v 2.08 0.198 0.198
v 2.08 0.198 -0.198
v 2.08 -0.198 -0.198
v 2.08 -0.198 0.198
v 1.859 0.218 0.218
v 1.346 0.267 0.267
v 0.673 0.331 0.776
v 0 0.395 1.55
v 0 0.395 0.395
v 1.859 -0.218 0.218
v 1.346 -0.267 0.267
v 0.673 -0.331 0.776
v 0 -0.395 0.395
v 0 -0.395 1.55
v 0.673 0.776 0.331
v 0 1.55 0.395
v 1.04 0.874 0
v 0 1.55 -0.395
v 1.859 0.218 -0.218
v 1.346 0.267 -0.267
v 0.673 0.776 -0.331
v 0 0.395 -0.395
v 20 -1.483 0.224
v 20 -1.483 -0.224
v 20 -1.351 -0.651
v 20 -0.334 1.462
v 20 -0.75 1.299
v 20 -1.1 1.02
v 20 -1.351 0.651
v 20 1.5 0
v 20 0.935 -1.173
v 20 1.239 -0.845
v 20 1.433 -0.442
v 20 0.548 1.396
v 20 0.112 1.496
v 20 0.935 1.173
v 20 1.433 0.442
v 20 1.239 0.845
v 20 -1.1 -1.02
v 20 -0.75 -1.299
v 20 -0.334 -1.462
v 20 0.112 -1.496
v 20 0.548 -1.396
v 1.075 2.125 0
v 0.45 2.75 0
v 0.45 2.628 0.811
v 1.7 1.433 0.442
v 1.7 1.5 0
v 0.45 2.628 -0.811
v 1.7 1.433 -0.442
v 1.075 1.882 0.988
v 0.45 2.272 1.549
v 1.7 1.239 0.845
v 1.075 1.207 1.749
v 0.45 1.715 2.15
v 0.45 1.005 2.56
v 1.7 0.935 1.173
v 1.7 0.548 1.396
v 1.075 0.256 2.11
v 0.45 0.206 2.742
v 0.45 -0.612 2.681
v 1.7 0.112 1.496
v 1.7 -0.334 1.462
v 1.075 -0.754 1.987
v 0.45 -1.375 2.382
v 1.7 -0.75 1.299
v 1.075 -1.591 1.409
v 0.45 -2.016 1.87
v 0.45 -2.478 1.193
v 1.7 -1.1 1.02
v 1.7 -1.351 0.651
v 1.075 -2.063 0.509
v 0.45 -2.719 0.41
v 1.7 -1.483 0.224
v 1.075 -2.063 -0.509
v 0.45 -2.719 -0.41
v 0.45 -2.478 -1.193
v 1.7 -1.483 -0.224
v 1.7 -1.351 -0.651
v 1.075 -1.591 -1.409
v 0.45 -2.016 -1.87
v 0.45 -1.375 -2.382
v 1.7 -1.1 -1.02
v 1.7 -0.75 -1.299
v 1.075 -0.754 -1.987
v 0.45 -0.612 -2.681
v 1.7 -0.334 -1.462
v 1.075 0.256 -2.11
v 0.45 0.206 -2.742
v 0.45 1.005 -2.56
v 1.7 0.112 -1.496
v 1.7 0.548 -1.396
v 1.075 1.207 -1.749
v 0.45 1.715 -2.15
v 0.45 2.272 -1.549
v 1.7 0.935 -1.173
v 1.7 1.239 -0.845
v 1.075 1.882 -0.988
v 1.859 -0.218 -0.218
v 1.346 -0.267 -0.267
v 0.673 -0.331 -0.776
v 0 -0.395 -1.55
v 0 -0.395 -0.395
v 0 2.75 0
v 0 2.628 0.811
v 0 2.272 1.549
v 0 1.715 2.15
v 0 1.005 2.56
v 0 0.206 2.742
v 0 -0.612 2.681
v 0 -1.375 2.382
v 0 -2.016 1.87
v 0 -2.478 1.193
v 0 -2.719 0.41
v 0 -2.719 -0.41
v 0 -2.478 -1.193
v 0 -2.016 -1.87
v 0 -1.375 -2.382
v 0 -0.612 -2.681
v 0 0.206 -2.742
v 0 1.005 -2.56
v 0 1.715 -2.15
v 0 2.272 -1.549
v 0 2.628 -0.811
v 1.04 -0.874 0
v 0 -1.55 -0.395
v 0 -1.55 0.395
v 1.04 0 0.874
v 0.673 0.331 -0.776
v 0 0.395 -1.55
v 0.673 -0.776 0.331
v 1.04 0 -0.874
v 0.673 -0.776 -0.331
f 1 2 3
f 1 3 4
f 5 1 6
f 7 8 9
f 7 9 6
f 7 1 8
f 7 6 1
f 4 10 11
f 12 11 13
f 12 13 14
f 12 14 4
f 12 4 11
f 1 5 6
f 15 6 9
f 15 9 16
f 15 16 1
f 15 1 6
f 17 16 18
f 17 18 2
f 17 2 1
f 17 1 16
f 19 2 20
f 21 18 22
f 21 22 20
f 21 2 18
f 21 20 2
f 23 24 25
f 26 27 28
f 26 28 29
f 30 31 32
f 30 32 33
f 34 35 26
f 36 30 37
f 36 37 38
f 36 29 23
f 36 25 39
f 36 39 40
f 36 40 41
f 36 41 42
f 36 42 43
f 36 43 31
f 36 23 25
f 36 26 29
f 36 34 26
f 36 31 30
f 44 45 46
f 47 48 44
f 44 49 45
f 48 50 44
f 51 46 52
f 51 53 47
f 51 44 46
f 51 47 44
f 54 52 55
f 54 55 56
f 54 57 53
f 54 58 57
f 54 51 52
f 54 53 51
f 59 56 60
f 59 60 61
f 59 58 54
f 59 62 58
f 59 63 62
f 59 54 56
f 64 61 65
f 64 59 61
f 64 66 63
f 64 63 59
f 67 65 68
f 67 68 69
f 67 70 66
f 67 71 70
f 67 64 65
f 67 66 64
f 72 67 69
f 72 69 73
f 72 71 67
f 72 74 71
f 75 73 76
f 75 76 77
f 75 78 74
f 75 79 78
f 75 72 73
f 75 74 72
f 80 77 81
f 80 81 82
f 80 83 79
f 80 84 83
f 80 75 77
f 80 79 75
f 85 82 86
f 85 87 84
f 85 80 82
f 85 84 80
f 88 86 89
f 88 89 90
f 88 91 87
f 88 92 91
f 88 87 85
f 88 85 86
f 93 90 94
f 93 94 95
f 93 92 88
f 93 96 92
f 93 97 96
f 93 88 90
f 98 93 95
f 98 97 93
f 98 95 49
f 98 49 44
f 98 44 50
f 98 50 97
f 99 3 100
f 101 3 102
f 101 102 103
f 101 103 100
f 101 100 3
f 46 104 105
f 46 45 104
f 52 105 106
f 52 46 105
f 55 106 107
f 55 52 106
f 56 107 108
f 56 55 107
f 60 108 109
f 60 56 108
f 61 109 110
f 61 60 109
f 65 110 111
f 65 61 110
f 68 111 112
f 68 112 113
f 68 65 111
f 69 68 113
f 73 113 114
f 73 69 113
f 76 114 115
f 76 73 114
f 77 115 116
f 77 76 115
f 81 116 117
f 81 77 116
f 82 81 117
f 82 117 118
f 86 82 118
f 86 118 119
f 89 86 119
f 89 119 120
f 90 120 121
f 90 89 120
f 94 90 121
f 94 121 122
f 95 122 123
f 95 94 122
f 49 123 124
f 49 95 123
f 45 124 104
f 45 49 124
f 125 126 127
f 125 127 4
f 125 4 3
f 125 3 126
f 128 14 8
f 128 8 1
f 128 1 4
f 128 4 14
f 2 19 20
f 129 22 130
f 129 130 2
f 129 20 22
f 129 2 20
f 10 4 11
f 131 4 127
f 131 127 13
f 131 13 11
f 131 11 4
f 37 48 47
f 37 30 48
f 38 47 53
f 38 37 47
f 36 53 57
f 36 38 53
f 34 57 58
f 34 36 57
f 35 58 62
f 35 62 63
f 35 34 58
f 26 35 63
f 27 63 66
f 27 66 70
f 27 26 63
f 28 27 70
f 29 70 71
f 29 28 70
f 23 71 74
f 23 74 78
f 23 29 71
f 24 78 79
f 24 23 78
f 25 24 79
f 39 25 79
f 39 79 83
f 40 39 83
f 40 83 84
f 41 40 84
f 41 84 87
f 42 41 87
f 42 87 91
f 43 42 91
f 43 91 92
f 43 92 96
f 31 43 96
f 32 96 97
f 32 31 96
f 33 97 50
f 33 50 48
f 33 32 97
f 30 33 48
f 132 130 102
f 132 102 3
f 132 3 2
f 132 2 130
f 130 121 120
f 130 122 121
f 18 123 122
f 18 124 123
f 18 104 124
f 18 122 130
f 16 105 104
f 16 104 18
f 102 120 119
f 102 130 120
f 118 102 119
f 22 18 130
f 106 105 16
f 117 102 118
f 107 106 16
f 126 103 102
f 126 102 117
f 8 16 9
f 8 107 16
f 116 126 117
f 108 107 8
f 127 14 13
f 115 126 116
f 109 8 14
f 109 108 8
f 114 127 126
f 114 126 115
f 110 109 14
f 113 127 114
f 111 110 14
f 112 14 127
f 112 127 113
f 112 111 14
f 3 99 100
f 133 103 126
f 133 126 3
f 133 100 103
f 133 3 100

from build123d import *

# Parameters (mm, degrees)
SKETCH3_W         = 0.79
SKETCH3_H         = 3.1
SKETCH4_W         = 0.395
SKETCH4_H         = 0.395
CIRPATTERN1_COUNT = 2
CIRPATTERN1_ANGLE = 90


with BuildPart() as part:
    # BodySke → Base-Revolve (revolve)
    with BuildSketch(Plane.XY):
        Polygon((0, 0), (0, 2.75), (0.45, 2.75), (1.7, 1.5), (20, 1.5), (20, 0), align=None)
    revolve(axis=Axis((-6.35, 0, 0), (1, 0, 0)))

    # Sketch3 → Cross section 0
    with BuildSketch(Plane.ZY):
        Rectangle(SKETCH3_W, SKETCH3_H)
    # Sketch4 → Cross section 1
    with BuildSketch(Plane.ZY.offset(-2.08)):
        Rectangle(SKETCH4_W, SKETCH4_H)
    cross = loft(mode=Mode.SUBTRACT)

    # CirPattern1: Cross ×2 about axis
    cirpattern1_axis = Axis((0, 0, 0), (1, 0, 0))
    for i in range(1, CIRPATTERN1_COUNT):
        add(cross.rotate(cirpattern1_axis, i * CIRPATTERN1_ANGLE / (CIRPATTERN1_COUNT - 1)), mode=Mode.SUBTRACT)


solid = part.part
